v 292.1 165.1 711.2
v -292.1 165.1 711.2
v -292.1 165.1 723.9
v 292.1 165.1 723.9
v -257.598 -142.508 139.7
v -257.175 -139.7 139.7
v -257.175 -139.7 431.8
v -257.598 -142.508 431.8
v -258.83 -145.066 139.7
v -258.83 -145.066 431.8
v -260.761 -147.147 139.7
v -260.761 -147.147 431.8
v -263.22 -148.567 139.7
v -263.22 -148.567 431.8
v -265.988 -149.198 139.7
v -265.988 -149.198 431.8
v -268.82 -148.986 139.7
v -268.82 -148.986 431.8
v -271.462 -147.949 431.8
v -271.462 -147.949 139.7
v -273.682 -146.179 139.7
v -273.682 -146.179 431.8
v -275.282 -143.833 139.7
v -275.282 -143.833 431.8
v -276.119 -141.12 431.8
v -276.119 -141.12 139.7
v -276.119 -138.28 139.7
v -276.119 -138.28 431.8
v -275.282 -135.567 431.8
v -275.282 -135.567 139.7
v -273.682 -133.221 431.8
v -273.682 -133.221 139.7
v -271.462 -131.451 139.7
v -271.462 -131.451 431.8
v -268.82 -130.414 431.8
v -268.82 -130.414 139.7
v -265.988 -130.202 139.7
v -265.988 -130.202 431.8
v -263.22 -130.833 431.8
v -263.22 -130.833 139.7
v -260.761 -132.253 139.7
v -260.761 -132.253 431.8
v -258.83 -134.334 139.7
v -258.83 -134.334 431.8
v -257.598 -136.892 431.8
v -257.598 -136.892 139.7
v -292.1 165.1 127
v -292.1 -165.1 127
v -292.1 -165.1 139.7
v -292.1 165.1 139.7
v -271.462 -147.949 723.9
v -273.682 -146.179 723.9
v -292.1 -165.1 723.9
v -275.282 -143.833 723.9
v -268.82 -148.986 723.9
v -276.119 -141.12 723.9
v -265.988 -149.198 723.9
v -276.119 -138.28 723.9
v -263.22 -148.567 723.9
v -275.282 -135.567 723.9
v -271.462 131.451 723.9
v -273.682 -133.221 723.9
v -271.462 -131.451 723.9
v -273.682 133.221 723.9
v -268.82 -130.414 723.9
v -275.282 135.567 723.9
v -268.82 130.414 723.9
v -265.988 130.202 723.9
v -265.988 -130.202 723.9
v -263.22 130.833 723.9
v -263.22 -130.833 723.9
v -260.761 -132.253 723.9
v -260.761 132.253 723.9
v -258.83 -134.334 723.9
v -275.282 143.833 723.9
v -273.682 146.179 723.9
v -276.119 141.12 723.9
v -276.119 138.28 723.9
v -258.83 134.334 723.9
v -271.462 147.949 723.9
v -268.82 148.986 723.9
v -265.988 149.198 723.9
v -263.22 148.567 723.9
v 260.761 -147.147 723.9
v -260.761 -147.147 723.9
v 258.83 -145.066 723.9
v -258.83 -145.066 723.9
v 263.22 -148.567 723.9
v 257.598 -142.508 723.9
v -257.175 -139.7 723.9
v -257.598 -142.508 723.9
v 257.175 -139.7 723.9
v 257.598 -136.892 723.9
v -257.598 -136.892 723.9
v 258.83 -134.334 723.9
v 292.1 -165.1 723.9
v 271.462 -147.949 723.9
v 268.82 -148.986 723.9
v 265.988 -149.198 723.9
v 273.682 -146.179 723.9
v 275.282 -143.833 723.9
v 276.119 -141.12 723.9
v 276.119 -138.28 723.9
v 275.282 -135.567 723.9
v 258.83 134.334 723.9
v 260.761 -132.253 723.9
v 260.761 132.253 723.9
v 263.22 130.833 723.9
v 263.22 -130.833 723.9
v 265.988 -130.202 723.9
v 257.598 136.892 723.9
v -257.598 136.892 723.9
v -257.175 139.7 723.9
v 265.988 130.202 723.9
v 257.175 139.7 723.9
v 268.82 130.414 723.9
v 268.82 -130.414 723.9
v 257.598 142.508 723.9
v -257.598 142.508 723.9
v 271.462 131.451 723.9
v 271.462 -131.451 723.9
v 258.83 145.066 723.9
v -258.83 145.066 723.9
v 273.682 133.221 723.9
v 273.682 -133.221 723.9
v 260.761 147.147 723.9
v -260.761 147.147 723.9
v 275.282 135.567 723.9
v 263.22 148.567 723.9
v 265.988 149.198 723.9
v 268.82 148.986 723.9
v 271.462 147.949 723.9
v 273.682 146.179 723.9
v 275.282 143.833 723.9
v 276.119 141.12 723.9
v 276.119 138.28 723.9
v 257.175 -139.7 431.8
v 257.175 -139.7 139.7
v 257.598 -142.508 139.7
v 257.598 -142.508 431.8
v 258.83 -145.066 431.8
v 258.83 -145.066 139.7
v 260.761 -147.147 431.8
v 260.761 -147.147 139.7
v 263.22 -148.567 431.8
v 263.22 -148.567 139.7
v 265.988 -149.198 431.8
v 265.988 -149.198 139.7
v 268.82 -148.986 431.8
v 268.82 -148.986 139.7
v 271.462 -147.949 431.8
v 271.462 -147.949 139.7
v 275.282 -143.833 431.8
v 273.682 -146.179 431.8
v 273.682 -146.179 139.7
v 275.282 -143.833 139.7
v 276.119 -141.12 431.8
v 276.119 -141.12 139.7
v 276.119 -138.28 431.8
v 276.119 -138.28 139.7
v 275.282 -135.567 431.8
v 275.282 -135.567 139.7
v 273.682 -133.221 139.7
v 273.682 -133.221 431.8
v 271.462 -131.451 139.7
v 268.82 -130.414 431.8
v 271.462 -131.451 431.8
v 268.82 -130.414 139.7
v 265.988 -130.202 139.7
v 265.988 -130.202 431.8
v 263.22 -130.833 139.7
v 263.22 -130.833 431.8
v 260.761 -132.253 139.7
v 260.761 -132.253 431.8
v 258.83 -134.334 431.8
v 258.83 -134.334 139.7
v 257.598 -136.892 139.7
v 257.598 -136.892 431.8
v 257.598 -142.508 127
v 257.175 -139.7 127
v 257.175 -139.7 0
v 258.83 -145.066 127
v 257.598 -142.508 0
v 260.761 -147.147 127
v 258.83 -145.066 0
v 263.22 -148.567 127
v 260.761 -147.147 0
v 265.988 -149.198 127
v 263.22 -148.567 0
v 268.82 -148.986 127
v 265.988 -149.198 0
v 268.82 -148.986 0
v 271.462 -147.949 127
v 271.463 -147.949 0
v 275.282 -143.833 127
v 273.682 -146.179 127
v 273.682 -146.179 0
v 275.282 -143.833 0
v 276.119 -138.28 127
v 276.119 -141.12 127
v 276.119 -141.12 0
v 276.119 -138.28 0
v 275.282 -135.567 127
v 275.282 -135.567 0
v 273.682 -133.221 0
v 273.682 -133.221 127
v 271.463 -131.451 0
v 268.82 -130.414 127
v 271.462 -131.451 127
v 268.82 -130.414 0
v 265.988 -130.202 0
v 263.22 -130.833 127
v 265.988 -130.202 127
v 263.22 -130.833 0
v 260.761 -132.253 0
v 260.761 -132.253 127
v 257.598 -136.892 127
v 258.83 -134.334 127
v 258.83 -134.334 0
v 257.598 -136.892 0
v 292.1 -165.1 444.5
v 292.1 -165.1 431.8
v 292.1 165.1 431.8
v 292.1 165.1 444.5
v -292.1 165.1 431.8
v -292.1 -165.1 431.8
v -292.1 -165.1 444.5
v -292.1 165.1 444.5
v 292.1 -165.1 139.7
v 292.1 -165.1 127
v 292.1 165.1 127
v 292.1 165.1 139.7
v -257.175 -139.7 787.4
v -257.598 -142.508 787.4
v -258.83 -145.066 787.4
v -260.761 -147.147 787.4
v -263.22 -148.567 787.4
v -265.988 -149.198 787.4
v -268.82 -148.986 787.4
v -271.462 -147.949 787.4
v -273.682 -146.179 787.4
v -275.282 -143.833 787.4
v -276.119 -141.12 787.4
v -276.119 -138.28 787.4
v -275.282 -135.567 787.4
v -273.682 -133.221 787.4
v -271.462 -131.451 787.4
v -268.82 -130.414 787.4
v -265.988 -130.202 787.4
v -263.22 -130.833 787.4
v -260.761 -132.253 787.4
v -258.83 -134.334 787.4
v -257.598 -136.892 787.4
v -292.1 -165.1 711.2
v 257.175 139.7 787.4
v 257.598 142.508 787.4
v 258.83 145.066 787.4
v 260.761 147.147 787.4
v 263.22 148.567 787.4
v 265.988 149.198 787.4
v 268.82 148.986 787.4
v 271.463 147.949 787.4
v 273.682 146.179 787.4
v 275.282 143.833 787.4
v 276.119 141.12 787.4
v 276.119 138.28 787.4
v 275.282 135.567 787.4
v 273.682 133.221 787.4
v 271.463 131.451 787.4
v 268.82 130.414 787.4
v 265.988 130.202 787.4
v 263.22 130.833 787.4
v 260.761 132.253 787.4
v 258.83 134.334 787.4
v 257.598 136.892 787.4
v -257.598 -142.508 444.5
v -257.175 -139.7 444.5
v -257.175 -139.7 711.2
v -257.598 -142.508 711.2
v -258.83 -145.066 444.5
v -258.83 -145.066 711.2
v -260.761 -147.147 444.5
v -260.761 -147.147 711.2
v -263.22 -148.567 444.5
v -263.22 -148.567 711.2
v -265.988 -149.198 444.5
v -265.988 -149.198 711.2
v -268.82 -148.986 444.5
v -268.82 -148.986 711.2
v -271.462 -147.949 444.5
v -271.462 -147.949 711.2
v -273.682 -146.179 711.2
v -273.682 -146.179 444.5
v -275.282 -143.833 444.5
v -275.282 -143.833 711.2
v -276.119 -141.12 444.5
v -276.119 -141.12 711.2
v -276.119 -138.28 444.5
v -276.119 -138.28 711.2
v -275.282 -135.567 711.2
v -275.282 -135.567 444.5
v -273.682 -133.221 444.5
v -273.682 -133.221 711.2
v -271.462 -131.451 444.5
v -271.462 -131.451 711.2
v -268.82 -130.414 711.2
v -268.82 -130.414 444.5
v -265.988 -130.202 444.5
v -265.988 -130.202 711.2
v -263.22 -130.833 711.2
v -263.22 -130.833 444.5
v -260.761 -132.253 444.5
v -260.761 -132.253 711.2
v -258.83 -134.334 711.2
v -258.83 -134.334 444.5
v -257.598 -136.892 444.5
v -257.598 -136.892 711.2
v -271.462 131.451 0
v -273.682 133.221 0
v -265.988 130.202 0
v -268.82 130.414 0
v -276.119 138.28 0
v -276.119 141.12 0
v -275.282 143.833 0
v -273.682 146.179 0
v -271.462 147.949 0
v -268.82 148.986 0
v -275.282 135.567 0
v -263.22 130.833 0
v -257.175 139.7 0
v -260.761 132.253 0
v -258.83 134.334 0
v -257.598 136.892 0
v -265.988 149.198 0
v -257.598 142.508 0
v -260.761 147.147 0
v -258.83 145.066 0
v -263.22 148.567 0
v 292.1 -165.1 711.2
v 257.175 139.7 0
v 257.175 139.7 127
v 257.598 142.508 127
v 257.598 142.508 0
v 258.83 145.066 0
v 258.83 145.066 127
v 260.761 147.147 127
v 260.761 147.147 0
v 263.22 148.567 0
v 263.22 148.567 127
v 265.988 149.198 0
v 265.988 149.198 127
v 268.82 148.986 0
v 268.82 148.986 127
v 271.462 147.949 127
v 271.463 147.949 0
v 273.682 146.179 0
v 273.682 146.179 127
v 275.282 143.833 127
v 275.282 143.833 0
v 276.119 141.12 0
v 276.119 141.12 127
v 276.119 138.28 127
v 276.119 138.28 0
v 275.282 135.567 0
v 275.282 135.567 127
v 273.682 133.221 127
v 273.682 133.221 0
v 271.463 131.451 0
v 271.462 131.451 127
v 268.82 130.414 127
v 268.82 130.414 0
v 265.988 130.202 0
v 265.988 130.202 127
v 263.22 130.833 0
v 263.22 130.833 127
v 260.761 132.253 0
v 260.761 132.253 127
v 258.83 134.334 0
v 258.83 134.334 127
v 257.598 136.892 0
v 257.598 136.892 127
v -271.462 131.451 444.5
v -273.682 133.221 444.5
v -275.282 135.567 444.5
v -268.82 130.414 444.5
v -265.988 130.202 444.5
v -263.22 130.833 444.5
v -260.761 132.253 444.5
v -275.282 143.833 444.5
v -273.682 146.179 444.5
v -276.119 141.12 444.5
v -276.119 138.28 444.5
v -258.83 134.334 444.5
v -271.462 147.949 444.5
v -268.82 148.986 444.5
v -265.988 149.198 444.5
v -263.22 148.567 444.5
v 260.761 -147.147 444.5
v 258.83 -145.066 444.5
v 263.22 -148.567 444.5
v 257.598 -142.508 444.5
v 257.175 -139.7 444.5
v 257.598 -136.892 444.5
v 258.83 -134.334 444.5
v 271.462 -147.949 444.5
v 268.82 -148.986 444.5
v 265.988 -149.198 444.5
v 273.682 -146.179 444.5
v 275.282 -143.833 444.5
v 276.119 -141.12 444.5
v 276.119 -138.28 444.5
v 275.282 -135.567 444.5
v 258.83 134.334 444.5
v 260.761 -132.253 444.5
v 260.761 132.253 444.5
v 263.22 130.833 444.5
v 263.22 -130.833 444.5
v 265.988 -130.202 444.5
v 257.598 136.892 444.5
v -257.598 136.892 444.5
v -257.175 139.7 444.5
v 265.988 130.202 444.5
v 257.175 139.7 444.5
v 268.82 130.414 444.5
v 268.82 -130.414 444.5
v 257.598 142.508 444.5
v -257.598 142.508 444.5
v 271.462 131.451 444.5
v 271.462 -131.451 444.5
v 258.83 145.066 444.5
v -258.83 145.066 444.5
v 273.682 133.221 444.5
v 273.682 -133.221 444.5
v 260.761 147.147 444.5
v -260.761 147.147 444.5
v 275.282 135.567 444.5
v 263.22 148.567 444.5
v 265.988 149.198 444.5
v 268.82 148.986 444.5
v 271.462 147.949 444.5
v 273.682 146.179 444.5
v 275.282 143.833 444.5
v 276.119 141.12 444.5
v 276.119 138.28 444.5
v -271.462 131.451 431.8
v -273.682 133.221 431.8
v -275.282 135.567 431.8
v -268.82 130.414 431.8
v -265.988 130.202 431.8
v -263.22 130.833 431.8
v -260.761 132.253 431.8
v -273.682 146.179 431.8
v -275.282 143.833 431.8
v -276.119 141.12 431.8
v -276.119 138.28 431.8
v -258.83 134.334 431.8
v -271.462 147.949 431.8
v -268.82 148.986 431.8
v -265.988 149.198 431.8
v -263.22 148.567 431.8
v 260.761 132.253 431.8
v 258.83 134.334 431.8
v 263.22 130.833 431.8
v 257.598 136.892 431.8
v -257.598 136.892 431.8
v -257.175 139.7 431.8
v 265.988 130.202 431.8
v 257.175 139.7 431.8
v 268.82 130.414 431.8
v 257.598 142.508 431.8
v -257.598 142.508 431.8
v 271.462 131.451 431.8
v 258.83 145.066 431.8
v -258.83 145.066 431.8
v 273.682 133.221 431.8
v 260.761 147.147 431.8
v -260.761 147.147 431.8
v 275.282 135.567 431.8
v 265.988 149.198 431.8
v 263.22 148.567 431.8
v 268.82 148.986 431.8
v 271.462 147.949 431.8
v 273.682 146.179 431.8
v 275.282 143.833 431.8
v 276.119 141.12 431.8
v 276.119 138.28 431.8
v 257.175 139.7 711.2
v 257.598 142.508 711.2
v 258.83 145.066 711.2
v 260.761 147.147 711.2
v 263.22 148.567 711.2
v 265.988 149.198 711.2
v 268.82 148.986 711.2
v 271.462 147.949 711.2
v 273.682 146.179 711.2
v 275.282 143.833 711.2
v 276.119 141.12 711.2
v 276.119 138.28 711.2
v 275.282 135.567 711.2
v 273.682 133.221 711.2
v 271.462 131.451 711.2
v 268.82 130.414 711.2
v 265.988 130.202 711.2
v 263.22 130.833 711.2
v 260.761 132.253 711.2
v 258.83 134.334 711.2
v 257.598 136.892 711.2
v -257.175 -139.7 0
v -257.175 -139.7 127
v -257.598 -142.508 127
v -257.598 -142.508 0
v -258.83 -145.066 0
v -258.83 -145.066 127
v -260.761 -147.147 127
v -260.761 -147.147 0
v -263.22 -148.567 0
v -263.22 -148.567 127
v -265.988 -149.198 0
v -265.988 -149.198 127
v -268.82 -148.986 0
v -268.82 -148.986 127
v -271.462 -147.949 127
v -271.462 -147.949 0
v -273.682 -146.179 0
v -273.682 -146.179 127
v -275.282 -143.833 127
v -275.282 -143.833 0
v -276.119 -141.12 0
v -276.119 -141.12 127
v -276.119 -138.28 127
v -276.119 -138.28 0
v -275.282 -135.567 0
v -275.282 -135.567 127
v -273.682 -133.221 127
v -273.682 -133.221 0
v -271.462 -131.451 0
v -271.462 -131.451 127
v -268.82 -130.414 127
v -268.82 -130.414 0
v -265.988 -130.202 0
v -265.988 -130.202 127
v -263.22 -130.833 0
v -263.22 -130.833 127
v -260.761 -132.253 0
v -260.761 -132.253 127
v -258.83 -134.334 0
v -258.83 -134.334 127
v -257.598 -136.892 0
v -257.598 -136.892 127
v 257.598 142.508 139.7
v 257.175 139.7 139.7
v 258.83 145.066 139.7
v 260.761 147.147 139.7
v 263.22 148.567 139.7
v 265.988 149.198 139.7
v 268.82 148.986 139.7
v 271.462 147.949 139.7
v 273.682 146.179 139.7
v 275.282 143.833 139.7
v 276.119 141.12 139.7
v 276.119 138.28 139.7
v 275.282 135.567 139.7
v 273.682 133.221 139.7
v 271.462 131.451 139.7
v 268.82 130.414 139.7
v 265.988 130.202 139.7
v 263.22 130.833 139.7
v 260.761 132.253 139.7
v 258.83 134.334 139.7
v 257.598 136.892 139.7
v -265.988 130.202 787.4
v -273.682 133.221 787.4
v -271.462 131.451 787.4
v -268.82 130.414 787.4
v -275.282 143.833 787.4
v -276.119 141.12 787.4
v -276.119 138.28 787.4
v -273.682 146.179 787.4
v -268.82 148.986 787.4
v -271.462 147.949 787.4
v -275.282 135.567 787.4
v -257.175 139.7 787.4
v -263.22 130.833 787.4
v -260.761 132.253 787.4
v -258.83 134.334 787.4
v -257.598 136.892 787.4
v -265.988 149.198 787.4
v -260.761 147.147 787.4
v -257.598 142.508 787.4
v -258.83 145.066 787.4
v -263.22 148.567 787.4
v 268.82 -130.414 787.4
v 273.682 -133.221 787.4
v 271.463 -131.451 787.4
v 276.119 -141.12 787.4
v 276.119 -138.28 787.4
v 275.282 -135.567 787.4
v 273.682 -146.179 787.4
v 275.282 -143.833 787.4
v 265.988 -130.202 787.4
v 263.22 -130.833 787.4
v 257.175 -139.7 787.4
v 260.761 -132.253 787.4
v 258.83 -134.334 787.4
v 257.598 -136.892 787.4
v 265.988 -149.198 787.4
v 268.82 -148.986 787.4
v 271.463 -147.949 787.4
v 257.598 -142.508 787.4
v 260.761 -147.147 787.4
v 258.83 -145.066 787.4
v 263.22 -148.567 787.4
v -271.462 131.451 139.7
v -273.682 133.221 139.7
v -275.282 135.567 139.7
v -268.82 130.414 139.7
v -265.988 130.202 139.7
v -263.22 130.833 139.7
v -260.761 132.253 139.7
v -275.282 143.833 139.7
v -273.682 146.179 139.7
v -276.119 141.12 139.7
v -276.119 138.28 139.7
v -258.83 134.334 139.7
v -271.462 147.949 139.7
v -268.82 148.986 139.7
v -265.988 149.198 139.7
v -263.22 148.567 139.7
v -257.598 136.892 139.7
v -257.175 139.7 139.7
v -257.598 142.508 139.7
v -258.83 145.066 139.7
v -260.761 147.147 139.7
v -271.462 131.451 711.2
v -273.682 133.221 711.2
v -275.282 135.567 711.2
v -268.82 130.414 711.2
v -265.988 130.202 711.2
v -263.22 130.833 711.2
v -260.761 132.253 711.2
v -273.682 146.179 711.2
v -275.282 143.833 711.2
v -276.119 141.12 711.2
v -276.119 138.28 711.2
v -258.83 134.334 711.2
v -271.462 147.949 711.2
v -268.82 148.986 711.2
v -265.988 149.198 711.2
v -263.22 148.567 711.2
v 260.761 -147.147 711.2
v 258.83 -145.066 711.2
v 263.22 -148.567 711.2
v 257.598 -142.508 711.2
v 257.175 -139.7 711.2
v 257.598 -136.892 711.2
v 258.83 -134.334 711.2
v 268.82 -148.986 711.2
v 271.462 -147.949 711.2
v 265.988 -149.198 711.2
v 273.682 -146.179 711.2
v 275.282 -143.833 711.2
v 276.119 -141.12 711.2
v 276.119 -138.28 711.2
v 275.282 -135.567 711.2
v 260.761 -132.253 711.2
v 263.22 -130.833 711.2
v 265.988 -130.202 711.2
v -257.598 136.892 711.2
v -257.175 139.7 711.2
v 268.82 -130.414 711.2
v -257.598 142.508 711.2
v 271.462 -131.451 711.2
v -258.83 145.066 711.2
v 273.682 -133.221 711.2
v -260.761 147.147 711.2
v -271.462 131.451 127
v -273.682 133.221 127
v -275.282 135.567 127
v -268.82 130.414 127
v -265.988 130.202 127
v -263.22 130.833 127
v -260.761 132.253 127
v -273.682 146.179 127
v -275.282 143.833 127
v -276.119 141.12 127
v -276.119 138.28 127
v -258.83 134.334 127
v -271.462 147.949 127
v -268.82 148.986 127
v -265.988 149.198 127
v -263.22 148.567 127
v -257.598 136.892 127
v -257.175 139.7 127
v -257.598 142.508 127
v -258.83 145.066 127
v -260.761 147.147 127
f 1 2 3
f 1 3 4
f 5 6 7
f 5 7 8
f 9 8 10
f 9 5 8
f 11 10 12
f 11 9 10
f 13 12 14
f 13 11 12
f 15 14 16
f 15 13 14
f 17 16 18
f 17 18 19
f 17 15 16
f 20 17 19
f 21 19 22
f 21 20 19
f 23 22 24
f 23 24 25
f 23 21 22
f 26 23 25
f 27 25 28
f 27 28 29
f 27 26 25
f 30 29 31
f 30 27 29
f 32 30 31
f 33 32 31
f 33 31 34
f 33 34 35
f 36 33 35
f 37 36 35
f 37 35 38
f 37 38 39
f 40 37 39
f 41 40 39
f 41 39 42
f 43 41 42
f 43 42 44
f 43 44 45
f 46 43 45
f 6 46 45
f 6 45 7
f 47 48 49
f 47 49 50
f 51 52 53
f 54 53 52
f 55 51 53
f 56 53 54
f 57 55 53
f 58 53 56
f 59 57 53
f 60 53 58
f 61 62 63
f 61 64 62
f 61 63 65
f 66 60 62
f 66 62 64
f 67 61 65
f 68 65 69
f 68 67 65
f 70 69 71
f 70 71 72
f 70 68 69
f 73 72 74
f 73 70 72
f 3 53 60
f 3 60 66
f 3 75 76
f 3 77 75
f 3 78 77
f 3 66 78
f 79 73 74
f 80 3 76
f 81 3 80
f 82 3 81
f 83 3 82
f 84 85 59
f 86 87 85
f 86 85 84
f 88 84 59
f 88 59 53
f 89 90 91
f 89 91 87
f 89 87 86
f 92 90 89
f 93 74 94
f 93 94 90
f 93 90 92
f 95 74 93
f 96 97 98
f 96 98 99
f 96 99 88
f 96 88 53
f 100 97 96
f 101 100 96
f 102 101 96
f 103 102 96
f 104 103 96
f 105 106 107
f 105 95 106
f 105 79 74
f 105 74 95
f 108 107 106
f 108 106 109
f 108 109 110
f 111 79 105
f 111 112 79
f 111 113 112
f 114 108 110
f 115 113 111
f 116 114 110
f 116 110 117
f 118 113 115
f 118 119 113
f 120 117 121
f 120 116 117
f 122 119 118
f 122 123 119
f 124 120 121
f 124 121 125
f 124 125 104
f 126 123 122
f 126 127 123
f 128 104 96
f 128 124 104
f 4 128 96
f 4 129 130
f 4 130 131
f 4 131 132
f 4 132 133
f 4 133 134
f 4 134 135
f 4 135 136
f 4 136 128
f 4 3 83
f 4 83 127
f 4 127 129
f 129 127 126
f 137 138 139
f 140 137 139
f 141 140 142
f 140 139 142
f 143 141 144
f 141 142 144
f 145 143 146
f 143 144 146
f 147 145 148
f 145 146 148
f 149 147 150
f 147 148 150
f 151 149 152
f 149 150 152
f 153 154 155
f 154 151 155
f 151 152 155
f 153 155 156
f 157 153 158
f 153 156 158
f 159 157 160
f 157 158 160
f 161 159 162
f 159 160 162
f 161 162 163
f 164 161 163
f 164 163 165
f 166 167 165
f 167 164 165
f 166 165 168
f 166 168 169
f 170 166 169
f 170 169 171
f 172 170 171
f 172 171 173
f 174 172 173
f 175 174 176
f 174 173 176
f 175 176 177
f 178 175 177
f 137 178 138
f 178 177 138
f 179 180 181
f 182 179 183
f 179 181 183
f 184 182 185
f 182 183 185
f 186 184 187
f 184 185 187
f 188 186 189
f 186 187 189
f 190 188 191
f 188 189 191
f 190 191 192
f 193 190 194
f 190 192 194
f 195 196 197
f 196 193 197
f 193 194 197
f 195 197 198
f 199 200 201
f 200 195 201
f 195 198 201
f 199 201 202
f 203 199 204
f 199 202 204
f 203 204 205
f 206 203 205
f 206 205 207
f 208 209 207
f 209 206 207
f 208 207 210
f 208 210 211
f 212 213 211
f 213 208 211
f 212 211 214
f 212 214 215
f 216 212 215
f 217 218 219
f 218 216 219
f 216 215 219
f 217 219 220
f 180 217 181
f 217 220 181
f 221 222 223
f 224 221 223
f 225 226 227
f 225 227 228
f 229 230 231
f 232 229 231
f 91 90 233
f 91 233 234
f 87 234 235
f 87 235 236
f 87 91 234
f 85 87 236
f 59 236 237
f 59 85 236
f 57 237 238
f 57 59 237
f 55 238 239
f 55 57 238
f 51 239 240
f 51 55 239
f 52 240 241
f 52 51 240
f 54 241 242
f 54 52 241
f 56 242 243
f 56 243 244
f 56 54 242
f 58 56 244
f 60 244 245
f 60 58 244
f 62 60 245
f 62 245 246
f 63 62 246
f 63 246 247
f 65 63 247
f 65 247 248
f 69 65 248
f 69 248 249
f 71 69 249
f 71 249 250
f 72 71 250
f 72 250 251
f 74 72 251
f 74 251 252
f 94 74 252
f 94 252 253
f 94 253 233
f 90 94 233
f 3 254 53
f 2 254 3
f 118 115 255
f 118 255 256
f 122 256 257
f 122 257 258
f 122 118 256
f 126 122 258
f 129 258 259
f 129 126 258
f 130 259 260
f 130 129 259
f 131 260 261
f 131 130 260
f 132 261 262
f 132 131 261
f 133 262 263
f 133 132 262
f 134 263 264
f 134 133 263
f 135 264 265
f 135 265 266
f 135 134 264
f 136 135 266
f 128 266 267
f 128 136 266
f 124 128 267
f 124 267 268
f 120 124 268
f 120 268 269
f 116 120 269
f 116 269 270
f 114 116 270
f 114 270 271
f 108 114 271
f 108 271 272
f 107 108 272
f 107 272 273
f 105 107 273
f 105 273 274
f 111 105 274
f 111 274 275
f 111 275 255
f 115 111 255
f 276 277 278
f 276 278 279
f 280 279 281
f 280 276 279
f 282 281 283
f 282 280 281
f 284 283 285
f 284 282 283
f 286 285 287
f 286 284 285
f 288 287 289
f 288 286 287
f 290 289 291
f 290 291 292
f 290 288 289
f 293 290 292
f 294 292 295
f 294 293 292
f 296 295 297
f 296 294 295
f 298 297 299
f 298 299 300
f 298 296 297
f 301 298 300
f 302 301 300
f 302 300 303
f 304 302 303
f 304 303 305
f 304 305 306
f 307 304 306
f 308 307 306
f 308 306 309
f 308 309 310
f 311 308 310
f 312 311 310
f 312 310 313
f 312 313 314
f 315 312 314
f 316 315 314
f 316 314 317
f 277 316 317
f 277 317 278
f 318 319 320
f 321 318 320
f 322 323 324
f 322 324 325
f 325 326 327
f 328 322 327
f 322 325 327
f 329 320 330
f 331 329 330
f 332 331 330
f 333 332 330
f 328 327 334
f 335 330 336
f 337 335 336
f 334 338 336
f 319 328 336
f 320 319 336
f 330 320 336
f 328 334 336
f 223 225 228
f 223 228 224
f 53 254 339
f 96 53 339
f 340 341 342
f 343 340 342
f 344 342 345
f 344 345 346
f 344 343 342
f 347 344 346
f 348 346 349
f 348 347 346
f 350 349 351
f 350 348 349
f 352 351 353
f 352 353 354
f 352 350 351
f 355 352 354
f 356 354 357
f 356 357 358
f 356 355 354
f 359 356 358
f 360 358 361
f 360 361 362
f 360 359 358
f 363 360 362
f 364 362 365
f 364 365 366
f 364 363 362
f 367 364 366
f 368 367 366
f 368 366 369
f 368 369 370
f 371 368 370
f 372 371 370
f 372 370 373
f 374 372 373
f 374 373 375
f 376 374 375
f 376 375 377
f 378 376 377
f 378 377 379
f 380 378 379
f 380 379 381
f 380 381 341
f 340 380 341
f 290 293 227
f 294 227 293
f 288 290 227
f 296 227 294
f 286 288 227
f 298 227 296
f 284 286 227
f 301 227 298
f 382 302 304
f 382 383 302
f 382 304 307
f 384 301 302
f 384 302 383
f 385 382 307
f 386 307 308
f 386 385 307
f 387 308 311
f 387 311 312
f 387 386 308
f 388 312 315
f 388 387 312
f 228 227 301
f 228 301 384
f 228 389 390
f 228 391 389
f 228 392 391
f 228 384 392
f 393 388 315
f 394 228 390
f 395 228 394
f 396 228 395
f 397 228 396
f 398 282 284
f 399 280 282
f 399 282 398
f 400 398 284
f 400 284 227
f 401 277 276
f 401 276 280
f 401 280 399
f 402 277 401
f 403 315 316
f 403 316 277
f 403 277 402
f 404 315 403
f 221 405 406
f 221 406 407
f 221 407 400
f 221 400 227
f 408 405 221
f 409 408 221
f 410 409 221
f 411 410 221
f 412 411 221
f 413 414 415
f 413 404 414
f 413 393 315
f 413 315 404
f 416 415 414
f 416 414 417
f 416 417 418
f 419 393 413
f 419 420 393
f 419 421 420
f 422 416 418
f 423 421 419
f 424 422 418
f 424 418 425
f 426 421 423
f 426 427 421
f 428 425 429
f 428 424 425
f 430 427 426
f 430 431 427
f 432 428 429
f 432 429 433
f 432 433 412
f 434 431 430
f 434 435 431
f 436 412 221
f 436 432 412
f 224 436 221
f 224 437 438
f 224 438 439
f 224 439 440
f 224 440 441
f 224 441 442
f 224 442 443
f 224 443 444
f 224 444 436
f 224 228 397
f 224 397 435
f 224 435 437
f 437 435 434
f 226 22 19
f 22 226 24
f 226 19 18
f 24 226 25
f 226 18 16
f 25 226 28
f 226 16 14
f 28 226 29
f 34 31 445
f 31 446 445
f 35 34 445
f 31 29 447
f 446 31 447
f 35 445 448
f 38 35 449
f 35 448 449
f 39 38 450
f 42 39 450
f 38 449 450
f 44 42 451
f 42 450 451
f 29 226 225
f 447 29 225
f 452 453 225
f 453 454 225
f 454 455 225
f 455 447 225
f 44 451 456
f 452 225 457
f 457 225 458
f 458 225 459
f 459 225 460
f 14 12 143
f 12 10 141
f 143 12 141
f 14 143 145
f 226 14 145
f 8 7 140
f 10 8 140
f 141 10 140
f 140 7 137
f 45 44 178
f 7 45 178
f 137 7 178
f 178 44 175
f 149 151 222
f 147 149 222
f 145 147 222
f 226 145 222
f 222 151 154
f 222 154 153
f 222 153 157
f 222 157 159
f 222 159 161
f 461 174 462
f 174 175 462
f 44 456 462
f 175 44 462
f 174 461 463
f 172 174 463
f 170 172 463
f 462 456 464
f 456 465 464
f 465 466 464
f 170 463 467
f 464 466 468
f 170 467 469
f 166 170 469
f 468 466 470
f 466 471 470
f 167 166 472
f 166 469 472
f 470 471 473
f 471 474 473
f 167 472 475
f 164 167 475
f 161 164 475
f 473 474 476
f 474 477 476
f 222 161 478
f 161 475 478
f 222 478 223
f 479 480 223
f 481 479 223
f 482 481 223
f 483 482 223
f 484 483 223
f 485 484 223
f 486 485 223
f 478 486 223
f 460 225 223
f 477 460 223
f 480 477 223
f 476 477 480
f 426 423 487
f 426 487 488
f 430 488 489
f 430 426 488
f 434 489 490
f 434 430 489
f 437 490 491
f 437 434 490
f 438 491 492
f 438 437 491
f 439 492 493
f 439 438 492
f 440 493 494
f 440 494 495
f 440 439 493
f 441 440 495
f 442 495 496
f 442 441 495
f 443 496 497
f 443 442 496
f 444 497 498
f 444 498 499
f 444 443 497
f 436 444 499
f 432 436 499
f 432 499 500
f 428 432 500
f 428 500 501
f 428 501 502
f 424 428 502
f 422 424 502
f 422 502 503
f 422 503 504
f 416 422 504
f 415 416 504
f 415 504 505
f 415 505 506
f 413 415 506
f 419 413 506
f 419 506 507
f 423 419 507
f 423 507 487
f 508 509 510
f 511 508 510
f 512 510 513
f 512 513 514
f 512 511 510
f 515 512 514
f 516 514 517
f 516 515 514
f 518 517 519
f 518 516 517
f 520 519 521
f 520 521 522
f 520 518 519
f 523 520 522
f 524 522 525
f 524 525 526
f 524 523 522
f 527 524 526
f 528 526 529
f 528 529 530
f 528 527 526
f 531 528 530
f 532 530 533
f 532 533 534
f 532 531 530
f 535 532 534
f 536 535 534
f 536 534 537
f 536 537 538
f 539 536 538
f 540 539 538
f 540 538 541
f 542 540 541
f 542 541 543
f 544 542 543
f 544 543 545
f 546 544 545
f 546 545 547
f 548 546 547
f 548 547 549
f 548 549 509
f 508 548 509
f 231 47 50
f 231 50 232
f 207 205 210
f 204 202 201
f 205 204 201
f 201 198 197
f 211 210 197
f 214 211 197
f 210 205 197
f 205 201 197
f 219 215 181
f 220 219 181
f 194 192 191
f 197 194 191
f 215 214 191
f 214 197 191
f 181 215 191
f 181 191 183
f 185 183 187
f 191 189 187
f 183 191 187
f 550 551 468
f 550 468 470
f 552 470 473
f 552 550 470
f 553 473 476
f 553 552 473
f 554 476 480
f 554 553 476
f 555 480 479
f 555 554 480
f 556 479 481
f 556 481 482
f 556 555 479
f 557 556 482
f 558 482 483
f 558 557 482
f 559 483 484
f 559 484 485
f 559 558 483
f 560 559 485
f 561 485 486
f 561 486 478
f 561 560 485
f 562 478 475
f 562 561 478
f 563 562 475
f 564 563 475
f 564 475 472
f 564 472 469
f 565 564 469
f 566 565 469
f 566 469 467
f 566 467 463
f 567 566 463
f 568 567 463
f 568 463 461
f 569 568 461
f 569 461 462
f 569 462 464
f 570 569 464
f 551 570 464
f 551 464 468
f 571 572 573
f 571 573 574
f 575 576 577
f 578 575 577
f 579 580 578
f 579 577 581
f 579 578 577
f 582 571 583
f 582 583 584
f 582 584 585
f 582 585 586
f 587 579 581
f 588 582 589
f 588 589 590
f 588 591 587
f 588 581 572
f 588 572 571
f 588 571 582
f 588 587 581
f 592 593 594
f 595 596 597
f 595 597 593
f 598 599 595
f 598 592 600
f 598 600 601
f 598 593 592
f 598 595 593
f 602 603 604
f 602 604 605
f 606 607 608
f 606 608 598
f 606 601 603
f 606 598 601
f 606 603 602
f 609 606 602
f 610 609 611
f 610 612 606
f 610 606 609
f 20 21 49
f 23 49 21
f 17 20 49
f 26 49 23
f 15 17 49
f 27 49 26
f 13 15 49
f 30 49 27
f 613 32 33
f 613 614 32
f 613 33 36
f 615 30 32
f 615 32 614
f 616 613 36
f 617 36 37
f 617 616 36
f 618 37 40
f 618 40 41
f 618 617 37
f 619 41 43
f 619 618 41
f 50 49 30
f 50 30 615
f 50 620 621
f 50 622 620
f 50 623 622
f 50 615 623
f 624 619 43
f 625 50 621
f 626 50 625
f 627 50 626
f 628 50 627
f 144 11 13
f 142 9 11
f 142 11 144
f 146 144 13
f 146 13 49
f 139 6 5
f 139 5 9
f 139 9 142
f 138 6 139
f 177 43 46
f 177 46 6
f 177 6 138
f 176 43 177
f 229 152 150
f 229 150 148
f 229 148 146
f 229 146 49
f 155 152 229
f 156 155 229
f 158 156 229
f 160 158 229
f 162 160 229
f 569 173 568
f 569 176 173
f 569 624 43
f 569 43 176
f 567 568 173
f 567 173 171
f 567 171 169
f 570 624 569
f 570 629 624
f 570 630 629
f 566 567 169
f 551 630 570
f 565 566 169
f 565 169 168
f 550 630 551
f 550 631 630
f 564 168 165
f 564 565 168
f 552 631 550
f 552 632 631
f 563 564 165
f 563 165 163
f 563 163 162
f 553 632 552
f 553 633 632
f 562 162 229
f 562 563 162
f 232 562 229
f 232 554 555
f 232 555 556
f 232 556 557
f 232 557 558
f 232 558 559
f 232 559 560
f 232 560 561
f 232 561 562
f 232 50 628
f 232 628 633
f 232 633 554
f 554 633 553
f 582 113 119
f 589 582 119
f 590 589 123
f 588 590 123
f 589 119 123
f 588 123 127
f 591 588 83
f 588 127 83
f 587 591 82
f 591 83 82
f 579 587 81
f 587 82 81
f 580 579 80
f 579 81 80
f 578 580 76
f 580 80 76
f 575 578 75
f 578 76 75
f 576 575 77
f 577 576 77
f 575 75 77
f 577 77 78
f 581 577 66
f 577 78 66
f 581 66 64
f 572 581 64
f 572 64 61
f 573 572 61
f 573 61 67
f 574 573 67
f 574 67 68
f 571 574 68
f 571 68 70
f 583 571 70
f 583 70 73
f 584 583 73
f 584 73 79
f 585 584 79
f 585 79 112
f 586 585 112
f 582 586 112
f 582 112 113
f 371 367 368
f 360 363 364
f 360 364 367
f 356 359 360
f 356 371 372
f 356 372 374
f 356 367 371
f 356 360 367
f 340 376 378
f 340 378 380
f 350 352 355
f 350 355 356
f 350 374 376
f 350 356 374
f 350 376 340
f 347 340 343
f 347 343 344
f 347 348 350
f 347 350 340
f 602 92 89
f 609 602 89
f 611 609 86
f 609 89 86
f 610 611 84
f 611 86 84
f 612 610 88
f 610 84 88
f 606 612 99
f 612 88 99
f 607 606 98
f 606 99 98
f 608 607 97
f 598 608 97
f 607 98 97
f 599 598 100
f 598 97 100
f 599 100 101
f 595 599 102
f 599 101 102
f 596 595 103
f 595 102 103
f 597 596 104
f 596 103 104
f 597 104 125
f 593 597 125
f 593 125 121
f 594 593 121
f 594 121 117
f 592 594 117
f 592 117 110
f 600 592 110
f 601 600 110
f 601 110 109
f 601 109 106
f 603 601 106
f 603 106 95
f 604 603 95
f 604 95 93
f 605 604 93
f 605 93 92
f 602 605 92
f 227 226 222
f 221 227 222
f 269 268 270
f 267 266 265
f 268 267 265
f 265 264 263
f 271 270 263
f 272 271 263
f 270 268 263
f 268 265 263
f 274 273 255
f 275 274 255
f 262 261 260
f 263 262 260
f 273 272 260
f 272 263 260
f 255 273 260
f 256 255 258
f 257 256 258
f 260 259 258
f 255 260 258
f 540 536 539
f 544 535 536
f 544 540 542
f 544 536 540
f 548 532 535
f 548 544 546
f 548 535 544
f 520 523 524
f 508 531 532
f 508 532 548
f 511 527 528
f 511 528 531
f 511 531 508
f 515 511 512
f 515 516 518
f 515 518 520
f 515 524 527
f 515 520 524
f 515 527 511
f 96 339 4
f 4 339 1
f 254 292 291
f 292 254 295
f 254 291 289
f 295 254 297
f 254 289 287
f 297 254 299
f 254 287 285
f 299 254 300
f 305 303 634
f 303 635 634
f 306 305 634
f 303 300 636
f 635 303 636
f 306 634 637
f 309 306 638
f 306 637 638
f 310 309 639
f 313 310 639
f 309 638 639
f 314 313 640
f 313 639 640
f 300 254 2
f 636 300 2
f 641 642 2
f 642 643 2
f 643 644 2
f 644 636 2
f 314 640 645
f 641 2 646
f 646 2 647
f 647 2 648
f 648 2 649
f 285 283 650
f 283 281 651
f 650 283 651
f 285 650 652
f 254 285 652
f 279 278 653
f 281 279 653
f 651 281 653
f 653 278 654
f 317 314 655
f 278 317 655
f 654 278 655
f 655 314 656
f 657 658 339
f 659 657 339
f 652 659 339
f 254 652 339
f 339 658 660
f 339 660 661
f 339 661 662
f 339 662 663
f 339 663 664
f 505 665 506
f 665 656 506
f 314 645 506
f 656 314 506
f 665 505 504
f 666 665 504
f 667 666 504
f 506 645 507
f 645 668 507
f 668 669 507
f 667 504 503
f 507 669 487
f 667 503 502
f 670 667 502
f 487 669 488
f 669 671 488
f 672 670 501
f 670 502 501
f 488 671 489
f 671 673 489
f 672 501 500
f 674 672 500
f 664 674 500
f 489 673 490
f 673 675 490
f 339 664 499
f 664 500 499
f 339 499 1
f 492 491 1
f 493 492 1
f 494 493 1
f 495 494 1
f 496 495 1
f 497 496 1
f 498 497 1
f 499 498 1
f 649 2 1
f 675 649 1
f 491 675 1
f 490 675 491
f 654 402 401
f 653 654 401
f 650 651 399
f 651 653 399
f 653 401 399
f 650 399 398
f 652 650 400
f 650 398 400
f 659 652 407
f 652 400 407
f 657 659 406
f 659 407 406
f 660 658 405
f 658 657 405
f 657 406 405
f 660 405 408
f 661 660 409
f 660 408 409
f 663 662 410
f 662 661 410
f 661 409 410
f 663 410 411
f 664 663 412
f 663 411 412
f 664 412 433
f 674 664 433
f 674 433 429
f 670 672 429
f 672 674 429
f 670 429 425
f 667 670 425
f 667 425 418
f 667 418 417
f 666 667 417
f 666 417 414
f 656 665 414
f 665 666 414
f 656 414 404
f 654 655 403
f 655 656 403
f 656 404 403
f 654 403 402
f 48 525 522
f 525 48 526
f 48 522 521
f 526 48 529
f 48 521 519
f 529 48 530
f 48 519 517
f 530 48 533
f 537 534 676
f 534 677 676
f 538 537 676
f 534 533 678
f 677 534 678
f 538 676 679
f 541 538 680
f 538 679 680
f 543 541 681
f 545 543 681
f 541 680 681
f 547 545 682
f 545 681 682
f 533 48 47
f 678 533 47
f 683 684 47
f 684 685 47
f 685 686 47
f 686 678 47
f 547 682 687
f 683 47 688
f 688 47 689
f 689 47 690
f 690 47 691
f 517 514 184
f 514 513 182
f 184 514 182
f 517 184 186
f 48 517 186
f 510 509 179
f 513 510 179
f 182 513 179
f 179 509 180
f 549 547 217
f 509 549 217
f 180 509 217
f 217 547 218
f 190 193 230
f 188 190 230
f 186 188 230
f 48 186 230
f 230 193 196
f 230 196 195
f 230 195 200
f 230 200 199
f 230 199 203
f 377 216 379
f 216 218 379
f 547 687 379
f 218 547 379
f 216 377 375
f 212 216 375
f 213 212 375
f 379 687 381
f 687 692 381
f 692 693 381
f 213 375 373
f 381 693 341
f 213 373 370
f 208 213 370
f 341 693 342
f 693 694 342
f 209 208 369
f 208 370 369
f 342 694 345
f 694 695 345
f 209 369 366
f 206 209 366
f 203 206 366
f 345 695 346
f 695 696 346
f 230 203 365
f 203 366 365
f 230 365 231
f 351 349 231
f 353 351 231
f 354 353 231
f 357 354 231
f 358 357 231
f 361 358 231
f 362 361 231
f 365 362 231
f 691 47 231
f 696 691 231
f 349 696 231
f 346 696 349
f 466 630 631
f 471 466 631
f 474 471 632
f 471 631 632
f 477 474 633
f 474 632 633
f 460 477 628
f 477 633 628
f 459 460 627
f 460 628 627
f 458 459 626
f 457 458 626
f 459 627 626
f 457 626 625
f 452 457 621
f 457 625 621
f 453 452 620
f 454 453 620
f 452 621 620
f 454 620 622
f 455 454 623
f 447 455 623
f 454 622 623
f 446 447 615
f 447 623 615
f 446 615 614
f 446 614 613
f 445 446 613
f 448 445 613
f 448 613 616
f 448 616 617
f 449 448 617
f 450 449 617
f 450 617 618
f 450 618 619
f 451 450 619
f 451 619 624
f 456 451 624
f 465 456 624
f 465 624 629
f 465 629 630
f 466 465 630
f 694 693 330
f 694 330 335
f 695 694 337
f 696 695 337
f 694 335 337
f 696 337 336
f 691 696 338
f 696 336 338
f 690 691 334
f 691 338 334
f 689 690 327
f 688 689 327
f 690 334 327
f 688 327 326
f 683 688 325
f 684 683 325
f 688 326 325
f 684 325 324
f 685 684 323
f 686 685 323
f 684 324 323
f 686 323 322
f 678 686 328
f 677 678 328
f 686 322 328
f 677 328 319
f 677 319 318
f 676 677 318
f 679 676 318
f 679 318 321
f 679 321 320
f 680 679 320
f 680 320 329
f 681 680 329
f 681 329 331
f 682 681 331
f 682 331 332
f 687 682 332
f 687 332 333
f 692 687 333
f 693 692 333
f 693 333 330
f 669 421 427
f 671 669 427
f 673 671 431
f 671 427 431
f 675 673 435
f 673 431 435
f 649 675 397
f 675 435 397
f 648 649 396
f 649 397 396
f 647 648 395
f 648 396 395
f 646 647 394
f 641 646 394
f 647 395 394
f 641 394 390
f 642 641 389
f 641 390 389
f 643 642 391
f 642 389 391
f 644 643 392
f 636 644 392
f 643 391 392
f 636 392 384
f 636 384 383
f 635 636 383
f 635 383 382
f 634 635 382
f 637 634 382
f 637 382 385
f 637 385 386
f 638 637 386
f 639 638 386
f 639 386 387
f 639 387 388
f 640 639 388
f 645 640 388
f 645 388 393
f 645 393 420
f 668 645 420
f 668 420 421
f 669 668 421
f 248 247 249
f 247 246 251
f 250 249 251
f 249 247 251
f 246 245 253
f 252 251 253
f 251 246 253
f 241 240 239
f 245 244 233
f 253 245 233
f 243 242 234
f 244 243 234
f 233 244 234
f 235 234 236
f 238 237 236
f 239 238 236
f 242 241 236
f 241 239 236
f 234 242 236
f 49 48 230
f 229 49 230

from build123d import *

# Parameters (mm, degrees)
F0_R     = 9.525
F1_DEPTH = 787.4
F4_START = 127
F0_W     = 584.2
F0_H     = 330.2
F4_DEPTH = 12.7
F5_START = 431.8
F5_DEPTH = 12.7
F6_START = 711.2
F6_DEPTH = 12.7


with BuildPart() as f1:
    # F0 (on Top) → F1 (new body)
    with BuildSketch(Plane.XY):
        with Locations((-266.7, 139.7)):
            Circle(F0_R)
    extrude(amount=F1_DEPTH)


with BuildPart() as f2_1:
    # F2: instance of F1
    add(f1.part.mirror(Plane.XZ))


with BuildPart() as f3_1:
    # F3: instance of F1
    add(f1.part.mirror(Plane.YZ))


with BuildPart() as f3_2:
    # F3: instance of F2_1
    add(f2_1.part.mirror(Plane.YZ))


with BuildPart() as f1_1:
    add(f1.part)

    add(f2_1.part)  # F4 merges F2_1

    add(f3_1.part)  # F4 merges F3_1

    add(f3_2.part)  # F4 merges F3_2
    # F0 (on Top) → F4 (join)
    with BuildSketch(Plane.XY.offset(F4_START)):
        Rectangle(F0_W, F0_H)
        with Locations((-266.7, 139.7)):
            Circle(F0_R, mode=Mode.SUBTRACT)
    extrude(amount=F4_DEPTH)

    # F0 (on Top) → F5 (join)
    with BuildSketch(Plane.XY.offset(F5_START)):
        Rectangle(F0_W, F0_H)
        with Locations((-266.7, 139.7)):
            Circle(F0_R, mode=Mode.SUBTRACT)
    extrude(amount=F5_DEPTH)

    # F0 (on Top) → F6 (join)
    with BuildSketch(Plane.XY.offset(F6_START)):
        Rectangle(F0_W, F0_H)
        with Locations((-266.7, 139.7)):
            Circle(F0_R, mode=Mode.SUBTRACT)
    extrude(amount=F6_DEPTH)


solid = f1_1.part
